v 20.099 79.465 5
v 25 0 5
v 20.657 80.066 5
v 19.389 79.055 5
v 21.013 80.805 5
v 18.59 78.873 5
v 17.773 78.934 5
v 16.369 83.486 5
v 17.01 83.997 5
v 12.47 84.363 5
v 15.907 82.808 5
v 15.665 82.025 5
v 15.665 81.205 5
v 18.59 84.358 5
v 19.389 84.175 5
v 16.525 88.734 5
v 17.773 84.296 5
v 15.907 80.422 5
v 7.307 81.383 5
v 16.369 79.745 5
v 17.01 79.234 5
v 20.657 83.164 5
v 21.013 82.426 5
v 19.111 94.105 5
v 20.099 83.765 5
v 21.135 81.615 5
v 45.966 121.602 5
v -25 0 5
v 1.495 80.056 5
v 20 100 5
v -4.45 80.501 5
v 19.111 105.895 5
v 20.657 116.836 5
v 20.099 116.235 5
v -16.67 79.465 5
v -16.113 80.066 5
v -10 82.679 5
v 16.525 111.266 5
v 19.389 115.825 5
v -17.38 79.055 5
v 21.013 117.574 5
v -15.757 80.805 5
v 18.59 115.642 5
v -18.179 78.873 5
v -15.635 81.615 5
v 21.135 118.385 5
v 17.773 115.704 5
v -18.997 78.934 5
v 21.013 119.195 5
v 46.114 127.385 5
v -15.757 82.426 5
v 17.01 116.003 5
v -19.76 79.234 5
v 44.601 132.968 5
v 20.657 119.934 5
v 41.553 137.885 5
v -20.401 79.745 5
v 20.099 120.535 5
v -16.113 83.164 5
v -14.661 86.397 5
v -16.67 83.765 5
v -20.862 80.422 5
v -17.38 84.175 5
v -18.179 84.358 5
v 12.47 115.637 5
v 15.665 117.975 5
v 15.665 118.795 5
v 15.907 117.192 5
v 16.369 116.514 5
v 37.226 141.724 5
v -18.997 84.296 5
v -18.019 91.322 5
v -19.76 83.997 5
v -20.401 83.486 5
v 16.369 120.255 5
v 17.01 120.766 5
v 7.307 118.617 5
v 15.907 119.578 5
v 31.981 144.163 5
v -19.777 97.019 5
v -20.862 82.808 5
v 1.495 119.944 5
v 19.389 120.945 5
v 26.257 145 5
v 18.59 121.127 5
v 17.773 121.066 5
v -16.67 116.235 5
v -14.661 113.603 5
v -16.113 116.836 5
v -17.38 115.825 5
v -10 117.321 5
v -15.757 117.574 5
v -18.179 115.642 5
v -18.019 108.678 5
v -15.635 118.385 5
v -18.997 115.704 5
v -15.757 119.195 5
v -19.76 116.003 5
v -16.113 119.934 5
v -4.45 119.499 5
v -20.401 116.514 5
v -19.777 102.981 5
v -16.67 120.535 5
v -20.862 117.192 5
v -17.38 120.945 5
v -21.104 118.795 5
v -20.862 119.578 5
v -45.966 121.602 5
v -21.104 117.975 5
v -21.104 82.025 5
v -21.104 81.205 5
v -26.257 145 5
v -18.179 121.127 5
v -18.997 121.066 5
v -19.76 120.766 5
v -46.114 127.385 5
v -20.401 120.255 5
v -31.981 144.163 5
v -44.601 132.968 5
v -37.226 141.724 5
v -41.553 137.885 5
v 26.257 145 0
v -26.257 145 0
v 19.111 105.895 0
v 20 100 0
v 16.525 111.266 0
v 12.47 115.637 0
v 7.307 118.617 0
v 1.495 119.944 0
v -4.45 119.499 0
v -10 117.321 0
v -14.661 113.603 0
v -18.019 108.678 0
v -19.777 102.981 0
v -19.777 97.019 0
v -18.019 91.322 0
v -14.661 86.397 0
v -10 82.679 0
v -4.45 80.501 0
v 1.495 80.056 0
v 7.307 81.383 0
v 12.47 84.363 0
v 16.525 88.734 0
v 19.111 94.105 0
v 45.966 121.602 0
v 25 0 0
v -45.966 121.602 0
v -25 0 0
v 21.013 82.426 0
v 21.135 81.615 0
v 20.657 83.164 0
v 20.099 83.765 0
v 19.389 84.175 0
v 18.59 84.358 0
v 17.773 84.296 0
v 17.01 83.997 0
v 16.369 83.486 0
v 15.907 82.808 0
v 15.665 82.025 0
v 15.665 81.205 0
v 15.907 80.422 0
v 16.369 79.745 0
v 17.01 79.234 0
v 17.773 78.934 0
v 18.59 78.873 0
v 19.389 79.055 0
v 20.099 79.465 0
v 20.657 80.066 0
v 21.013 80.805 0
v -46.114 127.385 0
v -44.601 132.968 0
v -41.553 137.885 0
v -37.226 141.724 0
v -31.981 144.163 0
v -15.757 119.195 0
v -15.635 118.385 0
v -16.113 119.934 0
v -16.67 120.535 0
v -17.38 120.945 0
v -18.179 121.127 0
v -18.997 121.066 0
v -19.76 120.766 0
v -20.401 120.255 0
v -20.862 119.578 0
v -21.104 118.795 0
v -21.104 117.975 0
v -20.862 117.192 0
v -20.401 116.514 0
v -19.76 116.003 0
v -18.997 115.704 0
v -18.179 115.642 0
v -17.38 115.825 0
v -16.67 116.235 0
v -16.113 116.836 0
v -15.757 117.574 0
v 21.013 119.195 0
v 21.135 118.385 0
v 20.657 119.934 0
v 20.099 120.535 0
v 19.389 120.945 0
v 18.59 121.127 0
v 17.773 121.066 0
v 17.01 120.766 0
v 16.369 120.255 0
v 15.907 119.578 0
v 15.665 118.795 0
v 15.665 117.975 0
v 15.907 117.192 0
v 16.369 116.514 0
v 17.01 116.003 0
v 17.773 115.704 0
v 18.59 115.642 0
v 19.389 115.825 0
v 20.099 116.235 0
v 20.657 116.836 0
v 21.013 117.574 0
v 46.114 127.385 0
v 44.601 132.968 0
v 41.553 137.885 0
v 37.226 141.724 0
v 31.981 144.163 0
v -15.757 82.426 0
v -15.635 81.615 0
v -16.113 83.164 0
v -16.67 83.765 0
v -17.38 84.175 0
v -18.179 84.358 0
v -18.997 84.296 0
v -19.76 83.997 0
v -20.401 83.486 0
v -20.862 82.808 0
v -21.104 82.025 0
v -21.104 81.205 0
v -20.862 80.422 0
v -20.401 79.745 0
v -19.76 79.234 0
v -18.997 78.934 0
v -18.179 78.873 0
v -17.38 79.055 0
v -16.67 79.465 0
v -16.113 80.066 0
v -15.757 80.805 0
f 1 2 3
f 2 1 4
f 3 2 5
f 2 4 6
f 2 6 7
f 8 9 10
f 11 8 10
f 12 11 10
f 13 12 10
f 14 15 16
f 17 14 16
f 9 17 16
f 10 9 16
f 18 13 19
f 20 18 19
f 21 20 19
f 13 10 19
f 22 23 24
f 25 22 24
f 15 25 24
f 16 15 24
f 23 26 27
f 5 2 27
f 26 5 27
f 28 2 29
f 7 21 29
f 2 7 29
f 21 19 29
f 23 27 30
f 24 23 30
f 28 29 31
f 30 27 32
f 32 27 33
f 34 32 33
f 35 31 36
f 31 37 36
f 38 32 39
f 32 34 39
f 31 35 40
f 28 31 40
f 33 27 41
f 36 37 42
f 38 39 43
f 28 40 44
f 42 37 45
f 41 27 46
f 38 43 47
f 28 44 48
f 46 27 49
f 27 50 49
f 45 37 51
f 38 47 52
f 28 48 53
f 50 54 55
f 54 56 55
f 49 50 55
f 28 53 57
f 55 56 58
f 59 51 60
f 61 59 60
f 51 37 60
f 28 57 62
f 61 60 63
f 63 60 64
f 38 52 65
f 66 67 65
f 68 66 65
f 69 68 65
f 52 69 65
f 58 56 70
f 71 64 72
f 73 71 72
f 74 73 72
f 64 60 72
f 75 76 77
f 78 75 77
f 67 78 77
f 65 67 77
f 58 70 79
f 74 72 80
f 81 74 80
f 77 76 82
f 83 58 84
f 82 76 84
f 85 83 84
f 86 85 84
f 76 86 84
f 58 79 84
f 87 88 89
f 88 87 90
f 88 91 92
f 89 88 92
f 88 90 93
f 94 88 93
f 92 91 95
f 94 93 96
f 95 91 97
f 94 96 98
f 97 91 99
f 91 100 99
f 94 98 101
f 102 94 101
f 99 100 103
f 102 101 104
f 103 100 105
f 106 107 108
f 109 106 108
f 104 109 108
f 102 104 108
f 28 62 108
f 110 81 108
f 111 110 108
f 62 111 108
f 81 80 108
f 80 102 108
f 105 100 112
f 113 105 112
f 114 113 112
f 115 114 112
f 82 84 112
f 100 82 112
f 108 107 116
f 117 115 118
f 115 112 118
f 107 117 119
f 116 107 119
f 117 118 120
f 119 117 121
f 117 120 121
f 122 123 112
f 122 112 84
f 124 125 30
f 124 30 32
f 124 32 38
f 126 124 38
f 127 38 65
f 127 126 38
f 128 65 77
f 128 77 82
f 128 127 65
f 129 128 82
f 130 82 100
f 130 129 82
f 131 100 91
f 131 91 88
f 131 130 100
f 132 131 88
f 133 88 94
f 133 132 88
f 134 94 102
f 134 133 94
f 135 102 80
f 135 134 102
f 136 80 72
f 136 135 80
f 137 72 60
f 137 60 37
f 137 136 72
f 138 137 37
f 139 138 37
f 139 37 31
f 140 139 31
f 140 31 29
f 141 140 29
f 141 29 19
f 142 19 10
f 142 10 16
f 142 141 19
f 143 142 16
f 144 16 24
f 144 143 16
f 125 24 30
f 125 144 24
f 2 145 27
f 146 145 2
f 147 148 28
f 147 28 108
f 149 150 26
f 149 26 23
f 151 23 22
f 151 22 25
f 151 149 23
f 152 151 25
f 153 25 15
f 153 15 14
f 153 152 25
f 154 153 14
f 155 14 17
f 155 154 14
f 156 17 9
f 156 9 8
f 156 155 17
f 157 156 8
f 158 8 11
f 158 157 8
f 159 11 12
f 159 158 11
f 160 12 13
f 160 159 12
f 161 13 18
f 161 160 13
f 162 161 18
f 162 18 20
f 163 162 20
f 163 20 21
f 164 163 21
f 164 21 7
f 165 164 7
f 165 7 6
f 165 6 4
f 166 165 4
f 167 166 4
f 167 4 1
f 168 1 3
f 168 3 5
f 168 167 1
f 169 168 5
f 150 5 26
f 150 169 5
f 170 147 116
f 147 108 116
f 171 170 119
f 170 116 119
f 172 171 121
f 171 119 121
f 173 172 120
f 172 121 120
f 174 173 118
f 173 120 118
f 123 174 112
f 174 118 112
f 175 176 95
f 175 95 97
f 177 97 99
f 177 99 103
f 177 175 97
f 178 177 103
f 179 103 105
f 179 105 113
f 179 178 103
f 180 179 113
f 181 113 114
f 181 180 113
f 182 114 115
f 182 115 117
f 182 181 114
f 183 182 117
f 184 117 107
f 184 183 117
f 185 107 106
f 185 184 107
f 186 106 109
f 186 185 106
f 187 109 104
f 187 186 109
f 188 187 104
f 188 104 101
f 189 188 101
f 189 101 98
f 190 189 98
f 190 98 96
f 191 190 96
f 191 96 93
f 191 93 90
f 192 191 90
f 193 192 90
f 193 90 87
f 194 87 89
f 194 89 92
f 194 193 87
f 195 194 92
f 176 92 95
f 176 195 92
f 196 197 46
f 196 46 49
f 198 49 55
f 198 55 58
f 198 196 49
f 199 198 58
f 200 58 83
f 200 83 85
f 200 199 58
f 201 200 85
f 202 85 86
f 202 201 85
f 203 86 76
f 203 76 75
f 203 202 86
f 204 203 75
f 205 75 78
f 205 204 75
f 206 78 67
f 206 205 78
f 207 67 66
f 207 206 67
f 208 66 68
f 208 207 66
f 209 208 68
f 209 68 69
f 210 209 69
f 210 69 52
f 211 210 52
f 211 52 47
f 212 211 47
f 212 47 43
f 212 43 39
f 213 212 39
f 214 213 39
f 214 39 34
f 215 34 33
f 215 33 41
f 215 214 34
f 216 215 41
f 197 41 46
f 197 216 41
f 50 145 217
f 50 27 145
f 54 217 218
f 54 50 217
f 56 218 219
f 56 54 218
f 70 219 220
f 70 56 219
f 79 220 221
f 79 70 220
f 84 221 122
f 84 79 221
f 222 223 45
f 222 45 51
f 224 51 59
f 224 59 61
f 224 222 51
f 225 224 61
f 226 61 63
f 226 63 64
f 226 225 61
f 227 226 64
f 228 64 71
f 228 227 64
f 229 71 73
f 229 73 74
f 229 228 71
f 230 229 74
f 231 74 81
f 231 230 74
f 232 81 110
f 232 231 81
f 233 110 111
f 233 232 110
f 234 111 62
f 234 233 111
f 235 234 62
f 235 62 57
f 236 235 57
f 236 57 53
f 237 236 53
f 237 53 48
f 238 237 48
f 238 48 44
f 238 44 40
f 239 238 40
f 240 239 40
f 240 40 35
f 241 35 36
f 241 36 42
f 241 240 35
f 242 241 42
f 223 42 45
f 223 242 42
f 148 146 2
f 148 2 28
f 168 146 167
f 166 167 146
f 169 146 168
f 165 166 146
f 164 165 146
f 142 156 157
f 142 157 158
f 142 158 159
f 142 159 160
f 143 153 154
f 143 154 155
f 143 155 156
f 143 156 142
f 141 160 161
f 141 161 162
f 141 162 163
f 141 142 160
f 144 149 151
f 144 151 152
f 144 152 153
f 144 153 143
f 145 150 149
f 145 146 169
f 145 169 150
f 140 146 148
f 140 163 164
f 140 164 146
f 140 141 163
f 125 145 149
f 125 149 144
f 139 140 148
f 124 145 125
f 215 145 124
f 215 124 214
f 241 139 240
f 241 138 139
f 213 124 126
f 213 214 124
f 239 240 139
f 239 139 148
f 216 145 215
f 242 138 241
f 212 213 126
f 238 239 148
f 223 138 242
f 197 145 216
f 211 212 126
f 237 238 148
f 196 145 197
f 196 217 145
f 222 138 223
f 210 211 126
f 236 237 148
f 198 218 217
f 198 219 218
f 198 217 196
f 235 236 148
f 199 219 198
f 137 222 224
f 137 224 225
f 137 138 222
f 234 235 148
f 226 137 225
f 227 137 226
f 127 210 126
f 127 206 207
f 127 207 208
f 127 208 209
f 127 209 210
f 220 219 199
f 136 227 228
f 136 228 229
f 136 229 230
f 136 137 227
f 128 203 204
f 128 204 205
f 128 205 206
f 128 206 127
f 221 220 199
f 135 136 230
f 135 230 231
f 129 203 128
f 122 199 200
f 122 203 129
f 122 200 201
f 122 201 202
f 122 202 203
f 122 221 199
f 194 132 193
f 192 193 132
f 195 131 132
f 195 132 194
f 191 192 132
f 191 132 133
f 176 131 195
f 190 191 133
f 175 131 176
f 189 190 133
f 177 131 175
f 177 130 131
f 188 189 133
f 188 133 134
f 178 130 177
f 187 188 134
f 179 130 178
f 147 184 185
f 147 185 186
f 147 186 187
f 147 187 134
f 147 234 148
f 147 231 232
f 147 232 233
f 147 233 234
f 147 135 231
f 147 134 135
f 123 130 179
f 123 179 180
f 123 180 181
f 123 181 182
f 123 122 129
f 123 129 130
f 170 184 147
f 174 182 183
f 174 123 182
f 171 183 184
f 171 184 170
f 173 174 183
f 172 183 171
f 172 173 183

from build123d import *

# Parameters (mm, degrees)
SKETCH1_R           = 20
SKETCH1_R_2         = 2.75
BOSS_EXTRUDE1_DEPTH = 5
FILLET1_R           = 20


with BuildPart() as part:
    # Sketch1 → Boss-Extrude1 (new body)
    with BuildSketch(Plane.XY):
        Polygon((25, 0), (-25, 0), (-50, 145), (50, 145), align=None)
        with Locations((0, 100)):
            Circle(SKETCH1_R, mode=Mode.SUBTRACT)
        with Locations((-18.384776311, 118.384776311)):
            Circle(SKETCH1_R_2, mode=Mode.SUBTRACT)
        with Locations((-18.384776311, 81.615223689)):
            Circle(SKETCH1_R_2, mode=Mode.SUBTRACT)
        with Locations((18.384776311, 81.615223689)):
            Circle(SKETCH1_R_2, mode=Mode.SUBTRACT)
        with Locations((18.384776311, 118.384776311)):
            Circle(SKETCH1_R_2, mode=Mode.SUBTRACT)
    extrude(amount=BOSS_EXTRUDE1_DEPTH)

    # Fillet1
    fillet1_edges = [part.edges().sort_by_distance(p)[0] for p in [
        (-50, 145, 2.5),
        (50, 145, 2.5),
    ]]
    fillet(fillet1_edges, radius=FILLET1_R)


solid = part.part
